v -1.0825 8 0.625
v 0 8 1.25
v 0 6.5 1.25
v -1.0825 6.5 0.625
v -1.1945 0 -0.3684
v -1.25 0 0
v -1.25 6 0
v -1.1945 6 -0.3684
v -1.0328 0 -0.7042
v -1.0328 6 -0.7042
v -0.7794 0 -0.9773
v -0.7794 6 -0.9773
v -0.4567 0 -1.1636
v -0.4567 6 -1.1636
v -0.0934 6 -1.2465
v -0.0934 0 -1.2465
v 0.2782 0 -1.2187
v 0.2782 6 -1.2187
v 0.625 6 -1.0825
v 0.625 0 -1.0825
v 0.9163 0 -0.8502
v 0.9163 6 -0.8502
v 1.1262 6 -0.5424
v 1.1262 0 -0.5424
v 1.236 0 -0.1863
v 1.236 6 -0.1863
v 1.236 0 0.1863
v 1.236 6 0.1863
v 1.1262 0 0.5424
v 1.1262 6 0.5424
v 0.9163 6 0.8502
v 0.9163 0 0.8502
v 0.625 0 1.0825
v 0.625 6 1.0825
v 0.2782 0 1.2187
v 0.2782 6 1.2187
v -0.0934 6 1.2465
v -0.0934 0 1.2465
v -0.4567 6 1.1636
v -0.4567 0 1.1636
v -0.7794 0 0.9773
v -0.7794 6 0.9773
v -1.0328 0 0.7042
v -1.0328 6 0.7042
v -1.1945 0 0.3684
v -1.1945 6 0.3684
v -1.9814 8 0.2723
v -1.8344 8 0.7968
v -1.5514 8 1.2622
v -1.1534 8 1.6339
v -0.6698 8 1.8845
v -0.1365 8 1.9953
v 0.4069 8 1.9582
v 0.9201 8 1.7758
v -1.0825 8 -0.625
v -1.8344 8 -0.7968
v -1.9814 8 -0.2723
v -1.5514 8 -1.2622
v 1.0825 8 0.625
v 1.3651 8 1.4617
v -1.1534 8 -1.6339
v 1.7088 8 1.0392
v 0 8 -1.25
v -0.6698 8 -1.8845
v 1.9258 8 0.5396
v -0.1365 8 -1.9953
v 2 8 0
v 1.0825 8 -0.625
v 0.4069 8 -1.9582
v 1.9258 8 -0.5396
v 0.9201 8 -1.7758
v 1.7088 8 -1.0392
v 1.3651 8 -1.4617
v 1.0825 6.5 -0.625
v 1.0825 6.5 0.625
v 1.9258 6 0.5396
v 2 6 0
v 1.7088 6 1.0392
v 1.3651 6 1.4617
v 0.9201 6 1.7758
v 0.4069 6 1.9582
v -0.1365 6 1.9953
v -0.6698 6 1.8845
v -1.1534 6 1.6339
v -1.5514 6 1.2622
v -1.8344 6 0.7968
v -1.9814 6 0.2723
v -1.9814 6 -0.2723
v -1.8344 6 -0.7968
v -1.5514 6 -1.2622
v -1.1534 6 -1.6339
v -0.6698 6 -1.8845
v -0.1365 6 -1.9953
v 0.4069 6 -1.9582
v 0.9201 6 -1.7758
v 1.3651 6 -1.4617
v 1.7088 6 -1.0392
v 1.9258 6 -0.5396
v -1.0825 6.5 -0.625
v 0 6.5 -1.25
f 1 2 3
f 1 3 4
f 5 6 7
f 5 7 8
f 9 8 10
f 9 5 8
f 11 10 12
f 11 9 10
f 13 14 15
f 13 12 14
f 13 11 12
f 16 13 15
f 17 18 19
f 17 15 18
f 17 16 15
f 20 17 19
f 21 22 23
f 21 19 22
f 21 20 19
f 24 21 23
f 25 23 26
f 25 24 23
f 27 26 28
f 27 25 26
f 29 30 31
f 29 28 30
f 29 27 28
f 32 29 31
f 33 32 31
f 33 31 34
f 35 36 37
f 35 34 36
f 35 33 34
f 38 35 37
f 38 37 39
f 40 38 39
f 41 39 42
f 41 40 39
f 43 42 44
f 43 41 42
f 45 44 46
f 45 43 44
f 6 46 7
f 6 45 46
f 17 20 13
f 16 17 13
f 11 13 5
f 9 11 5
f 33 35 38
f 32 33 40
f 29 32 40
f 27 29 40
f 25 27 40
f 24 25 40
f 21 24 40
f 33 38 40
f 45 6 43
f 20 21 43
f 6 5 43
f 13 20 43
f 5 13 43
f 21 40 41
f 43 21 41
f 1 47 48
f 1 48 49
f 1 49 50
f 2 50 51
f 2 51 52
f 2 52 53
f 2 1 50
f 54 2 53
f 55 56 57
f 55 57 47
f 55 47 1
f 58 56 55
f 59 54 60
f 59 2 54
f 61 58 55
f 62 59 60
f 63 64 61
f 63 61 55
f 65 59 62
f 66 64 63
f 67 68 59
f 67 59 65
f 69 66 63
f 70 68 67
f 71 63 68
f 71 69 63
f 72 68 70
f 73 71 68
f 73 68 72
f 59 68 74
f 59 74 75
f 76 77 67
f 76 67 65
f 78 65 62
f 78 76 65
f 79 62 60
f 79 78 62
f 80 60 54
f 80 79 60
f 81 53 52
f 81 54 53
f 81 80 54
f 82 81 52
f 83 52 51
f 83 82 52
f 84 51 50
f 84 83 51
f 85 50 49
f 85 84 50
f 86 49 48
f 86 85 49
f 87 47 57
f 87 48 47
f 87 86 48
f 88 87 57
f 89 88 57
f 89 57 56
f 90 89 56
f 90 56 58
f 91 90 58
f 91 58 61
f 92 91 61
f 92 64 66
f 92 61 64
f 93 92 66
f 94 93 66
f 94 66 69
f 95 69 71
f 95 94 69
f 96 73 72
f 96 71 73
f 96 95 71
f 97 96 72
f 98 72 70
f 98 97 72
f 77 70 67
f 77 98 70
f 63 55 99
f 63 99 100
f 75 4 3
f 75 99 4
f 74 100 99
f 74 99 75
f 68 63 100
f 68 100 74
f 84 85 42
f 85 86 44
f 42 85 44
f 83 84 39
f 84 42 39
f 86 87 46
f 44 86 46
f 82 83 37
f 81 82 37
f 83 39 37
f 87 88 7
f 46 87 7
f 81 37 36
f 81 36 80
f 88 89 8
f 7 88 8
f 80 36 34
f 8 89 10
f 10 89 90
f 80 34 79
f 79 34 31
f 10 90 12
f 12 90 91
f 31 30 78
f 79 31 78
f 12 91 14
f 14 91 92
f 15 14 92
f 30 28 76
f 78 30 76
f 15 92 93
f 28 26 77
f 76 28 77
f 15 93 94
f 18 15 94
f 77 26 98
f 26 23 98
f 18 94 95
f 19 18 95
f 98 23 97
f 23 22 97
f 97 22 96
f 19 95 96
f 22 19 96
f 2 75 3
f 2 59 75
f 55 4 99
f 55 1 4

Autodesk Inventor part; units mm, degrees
ref_plane "YZ Plane" through (0, 0, 0) normal (1, 0, 0) x (0, 1, 0)
ref_plane "XZ Plane" through (0, 0, 0) normal (0, 1, 0) x (-1, 0, 0)
ref_plane "XY Plane" through (0, 0, 0) normal (0, 0, 1) x (1, 0, 0)
sketch "Sketch1" plane through (0, 0, 0) normal (0, 1, 0) x (-1, 0, 0)
  circle A0 centre (0, 0) radius 1.25
  dimension "d0" = 2.5
extrude "Extrusion1" add sketch "Sketch1" along normal blind 6
sketch "Sketch2" plane through (0, 6, 0) normal (0, 1, 0) x (1, 0, 0)
  circle A0 centre (0, 0) radius 2
  dimension "d3" = 4
extrude "Extrusion2" add sketch "Sketch2" along normal blind 2
sketch "Sketch3" plane through (0, 8, 0) normal (0, 1, 0) x (1, 0, 0)
  circle A0 centre (0, 0) radius 1.25 projected
  line L0 (0, 1.25) -> (1.0825, 0.625)
  line L1 (1.0825, 0.625) -> (1.0825, -0.625)
  line L2 (1.0825, -0.625) -> (0, -1.25)
  line L3 (0, -1.25) -> (-1.0825, -0.625)
  line L4 (-1.0825, -0.625) -> (-1.0825, 0.625)
  line L5 (-1.0825, 0.625) -> (0, 1.25)
extrude "Extrusion3" cut sketch "Sketch3" against normal blind 1.5 contours L1 L2 L3 L4 L5 L0
properties part number "M2.5_bolt"
